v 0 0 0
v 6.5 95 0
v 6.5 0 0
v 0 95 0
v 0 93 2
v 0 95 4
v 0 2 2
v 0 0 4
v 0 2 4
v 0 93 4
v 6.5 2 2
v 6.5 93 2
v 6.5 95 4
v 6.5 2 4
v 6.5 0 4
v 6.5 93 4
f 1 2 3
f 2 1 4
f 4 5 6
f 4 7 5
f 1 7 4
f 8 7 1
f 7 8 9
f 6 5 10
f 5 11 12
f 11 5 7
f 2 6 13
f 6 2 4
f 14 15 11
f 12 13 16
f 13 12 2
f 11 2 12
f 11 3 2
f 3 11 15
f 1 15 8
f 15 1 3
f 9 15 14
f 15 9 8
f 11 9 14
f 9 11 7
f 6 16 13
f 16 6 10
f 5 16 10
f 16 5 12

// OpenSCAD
tab_length_mm = 2;
tab_height_mm = 4;

base_width_mm = 6.5;
base_length_mm = 91 + (2 * tab_length_mm);
base_height_mm = 2;

union(){
    linear_extrude(height = base_height_mm, center = false)
        square([ base_width_mm, base_length_mm]);

    translate([0, 0, 0])
        linear_extrude(height = tab_height_mm, center = false)
            square([ base_width_mm, tab_length_mm]);

    translate([0, base_length_mm - tab_length_mm, 0])
        linear_extrude(height = tab_height_mm, center = false)
            square([ base_width_mm, tab_length_mm]);
}
